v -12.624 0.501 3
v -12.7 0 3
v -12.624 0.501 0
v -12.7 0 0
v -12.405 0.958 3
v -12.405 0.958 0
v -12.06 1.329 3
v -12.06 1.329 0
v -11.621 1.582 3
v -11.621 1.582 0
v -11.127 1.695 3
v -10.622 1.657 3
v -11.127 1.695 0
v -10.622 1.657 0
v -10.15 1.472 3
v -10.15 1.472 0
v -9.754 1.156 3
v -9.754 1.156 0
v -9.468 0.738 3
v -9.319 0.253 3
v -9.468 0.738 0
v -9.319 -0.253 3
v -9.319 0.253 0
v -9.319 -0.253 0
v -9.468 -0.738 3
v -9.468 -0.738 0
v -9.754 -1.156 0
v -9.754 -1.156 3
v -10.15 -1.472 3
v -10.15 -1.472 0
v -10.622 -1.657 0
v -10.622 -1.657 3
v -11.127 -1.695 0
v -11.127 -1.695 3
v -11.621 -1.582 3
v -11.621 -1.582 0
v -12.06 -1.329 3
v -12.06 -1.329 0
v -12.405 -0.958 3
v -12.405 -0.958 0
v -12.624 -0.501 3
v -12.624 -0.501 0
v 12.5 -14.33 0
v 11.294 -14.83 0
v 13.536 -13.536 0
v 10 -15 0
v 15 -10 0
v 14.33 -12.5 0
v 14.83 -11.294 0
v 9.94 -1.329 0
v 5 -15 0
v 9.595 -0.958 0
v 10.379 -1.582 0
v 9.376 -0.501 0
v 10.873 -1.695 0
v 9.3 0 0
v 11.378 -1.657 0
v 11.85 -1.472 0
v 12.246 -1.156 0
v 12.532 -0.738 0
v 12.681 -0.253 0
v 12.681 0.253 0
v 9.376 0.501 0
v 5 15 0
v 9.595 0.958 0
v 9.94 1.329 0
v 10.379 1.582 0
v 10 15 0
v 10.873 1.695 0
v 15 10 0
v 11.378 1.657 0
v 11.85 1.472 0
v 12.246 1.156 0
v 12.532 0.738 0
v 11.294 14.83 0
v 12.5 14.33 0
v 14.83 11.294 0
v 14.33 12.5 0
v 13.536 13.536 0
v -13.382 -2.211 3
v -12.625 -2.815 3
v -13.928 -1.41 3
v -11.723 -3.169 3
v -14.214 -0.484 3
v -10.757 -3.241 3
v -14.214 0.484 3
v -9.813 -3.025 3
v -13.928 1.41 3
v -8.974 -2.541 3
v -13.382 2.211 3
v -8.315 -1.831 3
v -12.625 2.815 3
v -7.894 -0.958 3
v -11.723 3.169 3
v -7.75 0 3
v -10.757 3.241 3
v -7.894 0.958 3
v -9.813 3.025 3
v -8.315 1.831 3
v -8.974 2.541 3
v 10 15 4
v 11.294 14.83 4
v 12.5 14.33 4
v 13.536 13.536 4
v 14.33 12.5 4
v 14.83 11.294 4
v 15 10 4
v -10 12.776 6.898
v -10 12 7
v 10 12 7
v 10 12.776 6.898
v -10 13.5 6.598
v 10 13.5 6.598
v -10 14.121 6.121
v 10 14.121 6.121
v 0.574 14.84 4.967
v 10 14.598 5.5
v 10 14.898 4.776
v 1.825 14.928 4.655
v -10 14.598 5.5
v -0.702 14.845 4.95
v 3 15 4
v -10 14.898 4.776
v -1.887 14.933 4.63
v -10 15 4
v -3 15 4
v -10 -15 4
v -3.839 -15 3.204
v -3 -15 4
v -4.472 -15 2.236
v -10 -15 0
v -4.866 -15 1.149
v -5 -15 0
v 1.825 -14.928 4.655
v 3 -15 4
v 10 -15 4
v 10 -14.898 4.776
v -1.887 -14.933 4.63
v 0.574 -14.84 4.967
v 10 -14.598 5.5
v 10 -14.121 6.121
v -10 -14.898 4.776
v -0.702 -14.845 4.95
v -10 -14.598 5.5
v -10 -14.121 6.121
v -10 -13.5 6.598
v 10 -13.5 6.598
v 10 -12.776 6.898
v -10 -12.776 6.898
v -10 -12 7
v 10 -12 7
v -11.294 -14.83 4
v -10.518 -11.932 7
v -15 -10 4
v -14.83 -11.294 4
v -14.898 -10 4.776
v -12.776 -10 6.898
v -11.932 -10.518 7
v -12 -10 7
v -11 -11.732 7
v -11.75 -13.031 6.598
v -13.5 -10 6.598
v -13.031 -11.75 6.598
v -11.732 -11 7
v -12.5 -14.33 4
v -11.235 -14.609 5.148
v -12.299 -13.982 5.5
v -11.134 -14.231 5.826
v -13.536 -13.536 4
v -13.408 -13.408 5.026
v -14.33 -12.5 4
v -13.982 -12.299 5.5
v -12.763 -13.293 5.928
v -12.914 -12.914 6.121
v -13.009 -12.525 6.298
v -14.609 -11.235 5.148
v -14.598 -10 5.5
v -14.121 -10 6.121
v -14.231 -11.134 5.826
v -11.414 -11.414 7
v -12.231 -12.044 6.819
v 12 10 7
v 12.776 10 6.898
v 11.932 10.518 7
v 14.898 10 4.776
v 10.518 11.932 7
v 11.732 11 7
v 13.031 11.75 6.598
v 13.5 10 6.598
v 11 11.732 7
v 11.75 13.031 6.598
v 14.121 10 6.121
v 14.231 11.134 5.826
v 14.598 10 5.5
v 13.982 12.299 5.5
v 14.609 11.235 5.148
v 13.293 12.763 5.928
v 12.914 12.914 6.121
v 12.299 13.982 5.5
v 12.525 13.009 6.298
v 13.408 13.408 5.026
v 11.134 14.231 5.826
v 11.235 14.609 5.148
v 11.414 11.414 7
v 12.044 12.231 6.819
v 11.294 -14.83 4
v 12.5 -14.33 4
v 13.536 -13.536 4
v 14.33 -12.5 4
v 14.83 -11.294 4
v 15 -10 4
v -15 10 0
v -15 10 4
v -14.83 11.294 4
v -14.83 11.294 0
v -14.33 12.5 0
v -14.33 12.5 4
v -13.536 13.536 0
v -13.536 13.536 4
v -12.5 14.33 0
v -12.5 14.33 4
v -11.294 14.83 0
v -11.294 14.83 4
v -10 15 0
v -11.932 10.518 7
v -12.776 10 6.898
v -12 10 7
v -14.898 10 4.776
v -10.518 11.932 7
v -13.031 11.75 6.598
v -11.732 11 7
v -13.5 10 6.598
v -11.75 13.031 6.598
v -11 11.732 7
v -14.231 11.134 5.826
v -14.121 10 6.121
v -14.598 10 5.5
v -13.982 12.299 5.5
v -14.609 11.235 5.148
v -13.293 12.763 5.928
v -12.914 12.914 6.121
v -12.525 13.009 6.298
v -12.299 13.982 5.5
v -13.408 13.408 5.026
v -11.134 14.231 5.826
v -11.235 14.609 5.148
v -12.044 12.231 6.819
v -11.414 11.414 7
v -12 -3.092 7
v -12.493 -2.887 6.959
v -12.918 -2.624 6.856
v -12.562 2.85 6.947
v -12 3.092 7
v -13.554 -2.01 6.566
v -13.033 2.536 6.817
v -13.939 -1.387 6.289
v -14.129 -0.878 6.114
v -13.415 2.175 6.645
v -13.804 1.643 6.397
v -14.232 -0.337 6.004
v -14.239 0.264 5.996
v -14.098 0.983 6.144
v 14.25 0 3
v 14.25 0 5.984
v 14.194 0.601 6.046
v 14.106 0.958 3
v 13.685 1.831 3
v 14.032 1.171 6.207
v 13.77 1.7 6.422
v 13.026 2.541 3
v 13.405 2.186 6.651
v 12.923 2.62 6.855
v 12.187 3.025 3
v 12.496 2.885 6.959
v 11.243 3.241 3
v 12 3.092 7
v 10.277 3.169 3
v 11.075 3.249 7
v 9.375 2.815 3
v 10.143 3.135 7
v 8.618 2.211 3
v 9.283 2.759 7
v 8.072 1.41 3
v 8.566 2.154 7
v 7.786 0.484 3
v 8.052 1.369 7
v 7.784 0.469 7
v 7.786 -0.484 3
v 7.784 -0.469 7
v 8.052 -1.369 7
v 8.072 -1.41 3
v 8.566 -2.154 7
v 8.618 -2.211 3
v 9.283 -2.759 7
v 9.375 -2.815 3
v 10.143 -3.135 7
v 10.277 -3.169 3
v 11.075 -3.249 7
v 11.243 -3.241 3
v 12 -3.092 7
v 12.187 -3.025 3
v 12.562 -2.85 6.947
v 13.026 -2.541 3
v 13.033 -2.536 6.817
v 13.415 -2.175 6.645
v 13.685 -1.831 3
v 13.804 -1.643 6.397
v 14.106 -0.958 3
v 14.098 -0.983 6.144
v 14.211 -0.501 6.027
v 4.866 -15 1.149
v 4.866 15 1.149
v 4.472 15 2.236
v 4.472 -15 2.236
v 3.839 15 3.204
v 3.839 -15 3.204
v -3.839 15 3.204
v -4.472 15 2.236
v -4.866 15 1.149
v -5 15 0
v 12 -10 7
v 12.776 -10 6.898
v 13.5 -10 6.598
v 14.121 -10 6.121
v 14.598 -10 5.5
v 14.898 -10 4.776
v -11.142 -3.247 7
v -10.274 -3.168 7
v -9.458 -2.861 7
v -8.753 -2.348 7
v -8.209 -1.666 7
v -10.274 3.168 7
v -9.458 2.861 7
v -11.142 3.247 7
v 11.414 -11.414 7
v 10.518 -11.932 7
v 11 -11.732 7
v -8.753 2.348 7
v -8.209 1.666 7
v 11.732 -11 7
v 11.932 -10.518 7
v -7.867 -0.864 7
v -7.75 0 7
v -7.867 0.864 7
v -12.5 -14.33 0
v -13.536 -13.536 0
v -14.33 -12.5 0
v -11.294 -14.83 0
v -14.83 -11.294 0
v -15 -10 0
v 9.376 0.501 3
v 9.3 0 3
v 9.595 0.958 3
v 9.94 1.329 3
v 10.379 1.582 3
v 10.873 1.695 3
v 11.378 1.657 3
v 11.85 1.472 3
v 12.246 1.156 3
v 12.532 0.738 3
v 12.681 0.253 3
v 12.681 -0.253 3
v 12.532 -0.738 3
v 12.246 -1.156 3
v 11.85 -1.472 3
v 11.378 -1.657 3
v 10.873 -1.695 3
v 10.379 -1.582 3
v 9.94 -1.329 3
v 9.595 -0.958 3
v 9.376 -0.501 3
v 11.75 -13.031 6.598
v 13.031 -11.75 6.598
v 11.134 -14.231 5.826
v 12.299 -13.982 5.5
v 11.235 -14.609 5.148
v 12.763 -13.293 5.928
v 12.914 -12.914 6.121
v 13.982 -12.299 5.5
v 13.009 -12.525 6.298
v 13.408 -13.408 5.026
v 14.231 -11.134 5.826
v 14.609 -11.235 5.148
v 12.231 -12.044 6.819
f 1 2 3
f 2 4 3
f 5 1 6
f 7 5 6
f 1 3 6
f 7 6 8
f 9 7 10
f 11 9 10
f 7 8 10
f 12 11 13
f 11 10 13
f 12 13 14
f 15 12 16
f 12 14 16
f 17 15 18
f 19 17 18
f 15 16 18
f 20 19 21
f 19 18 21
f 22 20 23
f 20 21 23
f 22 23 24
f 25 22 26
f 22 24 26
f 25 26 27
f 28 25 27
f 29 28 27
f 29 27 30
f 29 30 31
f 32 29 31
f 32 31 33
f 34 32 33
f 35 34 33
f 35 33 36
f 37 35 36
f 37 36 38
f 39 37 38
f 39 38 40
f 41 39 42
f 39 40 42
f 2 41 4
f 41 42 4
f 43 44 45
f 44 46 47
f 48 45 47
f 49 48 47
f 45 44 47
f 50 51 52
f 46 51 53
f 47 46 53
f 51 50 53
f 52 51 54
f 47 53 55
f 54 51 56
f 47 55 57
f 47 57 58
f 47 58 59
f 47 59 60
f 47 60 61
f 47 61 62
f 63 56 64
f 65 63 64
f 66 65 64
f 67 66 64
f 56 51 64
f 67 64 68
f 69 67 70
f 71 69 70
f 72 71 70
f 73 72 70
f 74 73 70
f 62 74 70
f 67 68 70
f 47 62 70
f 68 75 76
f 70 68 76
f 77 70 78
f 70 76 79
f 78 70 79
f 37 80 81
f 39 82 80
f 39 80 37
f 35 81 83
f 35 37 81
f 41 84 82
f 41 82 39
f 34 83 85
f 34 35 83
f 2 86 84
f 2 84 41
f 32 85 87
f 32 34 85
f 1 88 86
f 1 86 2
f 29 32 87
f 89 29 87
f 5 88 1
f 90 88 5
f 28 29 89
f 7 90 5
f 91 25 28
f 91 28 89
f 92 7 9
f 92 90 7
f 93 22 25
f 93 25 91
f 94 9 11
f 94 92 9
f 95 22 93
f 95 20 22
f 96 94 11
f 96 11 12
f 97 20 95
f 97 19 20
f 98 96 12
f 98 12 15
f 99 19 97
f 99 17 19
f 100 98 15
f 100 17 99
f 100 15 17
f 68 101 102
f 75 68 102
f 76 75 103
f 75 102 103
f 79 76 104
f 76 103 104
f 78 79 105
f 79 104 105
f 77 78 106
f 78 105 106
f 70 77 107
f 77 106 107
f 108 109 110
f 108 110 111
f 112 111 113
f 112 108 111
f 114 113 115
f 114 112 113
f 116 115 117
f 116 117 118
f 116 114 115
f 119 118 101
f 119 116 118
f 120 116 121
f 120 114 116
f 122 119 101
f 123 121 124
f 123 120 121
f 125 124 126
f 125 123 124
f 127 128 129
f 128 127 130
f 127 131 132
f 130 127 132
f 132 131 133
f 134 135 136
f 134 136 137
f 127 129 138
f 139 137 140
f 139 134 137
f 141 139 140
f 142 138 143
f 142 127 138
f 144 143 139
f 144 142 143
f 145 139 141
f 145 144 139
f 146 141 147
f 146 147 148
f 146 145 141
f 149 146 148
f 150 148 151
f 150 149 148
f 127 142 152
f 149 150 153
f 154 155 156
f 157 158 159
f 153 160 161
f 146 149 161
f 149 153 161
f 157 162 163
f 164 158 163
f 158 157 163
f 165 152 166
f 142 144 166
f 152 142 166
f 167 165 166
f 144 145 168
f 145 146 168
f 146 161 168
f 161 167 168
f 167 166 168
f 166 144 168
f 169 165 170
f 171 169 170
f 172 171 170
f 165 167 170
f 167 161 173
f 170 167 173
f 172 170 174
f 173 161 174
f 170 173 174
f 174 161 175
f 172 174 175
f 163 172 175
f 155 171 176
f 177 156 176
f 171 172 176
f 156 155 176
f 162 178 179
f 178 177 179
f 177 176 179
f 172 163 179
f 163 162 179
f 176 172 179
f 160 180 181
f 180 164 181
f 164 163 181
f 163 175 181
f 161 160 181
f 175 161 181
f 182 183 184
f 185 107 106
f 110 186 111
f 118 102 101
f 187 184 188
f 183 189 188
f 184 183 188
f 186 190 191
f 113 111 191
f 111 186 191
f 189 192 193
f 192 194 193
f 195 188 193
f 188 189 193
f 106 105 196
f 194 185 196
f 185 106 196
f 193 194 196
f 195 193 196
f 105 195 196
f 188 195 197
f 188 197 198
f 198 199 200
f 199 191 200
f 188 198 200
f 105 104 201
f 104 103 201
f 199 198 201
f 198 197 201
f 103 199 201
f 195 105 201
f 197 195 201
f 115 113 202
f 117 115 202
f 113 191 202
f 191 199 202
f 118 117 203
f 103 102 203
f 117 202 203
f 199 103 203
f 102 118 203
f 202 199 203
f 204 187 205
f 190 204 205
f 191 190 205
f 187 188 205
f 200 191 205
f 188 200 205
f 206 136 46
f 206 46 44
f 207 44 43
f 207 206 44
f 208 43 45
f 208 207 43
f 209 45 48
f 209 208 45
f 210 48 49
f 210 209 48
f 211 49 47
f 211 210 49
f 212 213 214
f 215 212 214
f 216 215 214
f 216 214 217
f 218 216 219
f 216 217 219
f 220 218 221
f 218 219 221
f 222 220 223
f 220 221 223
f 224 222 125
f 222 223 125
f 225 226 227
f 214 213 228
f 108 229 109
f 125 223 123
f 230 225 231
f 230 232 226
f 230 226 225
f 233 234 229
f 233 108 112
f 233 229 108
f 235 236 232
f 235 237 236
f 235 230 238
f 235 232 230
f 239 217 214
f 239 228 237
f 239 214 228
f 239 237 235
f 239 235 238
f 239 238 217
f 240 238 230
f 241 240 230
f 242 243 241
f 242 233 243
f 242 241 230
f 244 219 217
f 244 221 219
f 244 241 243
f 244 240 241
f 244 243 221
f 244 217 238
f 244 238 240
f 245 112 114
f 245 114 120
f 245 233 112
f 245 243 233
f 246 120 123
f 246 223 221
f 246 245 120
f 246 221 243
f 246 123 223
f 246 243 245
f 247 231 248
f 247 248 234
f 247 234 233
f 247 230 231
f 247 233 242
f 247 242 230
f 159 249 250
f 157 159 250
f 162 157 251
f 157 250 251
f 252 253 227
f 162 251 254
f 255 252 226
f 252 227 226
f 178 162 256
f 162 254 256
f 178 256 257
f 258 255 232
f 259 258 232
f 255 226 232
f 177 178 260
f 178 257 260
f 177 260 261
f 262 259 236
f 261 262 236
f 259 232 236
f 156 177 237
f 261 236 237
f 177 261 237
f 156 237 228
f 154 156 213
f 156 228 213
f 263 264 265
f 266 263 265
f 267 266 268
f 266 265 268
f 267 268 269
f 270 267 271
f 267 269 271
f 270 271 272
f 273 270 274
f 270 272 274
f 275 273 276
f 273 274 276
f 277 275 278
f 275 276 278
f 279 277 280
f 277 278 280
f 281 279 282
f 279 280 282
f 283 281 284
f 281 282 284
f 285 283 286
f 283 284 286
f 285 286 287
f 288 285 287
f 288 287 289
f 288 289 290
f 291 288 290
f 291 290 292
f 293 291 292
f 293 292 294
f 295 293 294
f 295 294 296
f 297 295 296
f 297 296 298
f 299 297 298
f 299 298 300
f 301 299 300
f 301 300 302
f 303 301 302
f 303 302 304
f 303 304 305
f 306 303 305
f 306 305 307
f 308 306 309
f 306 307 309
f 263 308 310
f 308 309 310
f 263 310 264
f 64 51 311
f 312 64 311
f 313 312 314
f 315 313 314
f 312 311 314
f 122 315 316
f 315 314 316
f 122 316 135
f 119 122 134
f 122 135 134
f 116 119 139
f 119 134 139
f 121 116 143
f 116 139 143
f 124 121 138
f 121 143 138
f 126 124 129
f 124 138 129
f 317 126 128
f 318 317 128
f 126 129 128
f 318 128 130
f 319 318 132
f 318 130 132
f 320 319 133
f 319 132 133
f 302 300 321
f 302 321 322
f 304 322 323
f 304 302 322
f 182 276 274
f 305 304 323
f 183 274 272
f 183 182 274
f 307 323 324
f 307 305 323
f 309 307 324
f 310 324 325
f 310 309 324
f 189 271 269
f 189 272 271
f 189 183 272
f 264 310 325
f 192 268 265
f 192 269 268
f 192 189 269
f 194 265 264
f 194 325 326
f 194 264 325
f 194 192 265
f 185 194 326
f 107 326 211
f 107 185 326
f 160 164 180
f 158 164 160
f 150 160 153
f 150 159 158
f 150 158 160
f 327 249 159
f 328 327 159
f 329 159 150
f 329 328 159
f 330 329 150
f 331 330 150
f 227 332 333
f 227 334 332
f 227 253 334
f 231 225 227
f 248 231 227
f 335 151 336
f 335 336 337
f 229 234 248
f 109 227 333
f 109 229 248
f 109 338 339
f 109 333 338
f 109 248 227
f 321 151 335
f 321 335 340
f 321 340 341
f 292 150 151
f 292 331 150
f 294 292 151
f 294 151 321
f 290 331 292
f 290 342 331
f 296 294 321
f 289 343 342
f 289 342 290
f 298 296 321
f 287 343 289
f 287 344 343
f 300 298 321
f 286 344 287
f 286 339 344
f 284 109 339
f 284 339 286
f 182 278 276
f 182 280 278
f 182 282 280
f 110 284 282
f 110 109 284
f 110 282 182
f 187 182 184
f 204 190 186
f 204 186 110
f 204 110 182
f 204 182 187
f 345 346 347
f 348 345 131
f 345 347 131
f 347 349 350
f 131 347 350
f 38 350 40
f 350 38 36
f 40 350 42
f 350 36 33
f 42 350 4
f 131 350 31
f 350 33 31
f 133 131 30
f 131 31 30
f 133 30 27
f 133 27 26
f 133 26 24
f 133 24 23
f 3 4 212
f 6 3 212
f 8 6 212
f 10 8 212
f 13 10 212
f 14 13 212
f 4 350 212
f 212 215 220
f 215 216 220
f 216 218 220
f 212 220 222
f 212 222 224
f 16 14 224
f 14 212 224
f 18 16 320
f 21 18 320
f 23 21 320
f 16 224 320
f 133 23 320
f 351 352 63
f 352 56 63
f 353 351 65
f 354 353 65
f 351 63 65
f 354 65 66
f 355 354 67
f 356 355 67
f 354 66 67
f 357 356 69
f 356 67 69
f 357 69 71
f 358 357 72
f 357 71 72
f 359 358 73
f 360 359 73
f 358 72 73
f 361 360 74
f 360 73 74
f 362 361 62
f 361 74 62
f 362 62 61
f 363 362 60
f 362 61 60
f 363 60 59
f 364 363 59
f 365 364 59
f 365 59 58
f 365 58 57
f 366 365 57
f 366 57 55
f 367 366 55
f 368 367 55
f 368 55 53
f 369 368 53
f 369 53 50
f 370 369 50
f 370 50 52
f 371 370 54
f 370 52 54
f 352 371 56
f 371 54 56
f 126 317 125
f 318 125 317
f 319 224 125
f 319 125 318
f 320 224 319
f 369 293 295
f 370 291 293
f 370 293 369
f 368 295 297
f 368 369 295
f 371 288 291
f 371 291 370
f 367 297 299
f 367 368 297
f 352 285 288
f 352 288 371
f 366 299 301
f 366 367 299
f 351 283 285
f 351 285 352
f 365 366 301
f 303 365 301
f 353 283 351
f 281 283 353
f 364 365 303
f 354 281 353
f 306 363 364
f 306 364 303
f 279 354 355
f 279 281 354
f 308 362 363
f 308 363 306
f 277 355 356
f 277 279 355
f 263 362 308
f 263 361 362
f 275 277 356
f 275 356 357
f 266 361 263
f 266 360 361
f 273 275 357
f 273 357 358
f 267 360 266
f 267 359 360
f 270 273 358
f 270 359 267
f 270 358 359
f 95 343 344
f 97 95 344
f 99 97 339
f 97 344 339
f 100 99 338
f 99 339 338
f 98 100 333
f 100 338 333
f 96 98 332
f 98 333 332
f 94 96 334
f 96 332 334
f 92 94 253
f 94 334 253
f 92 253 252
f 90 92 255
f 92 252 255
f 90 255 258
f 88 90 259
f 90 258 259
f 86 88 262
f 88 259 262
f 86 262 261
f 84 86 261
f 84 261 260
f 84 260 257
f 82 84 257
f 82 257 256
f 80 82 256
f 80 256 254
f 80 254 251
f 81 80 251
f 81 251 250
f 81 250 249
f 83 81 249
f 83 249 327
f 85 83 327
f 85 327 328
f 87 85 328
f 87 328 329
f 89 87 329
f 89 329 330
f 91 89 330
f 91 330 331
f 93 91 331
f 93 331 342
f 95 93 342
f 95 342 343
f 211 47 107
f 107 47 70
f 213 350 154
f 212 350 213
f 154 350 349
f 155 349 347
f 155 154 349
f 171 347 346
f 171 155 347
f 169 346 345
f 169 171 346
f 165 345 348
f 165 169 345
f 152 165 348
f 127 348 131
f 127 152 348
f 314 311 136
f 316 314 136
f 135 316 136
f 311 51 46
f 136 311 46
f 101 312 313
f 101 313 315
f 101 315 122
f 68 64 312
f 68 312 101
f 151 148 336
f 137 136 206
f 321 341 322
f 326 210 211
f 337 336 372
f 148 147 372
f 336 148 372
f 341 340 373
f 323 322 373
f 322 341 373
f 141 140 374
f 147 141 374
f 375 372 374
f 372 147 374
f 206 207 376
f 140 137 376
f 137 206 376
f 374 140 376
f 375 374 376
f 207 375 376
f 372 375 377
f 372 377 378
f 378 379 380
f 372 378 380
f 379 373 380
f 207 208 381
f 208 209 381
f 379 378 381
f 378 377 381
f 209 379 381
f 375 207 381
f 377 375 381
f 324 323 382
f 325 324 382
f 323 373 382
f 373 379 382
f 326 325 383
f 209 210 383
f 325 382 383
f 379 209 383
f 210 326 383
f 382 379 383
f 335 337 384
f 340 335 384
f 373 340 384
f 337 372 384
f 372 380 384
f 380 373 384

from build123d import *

# Parameters (mm, degrees)
F0_W           = 30
F0_H           = 30
F1_DEPTH       = 7
F3_D           = 3.4
F3_CBORE_D     = 6.5
F3_CBORE_DEPTH = 4
F5_DEPTH       = 30
F6_R           = 5
F7_T1_DEPTH    = 20
F7_T3_DEPTH    = 20
F7_T6_ANGLE    = 90
F7_T8_ANGLE    = 90
F7_T10_ANGLE   = 90
F7_T12_ANGLE   = 90


# Not quite as in the source:
# - a fillet or chamfer that OpenCascade refuses, or shapes differently, is made with other operations: its cross-section is extruded or revolved along the edge and cut away or added


with BuildPart() as f1:
    # F0 (on Top) → F1 (new body)
    with BuildSketch(Plane.XY):
        Rectangle(F0_W, F0_H)
    extrude(amount=F1_DEPTH)

    # F3 (through all)
    with Locations(Plane.XY.offset(7)):
        with Locations((-11, 0), (11, 0)):
            CounterBoreHole(F3_D / 2, F3_CBORE_D / 2, F3_CBORE_DEPTH)

    # F4 (on face) → F5 (cut, through all)
    with BuildSketch(Plane.XZ.offset(15)):
        with BuildLine():
            Line((-5, 0), (5, 0))
            ThreePointArc((5, 0), (0, 5), (-5, 0))
        make_face()
    extrude(amount=-F5_DEPTH, mode=Mode.SUBTRACT)

    # F6
    f6_edges = [f1.edges().sort_by_distance(p)[0] for p in [
        (15, -15, 3.5),
        (-15, -15, 3.5),
        (15, 15, 3.5),
        (-15, 15, 3.5),
    ]]
    fillet(f6_edges, radius=F6_R)

    # F7: fillet of radius 3 on 8 edges, made by hand

    # F7_s2 → F7_t1 (cut)
    with BuildSketch(Plane.YZ.offset(-10)):
        with BuildLine():
            ThreePointArc((-15, 4), (-14.1213203436, 6.1213203436), (-12, 7))
            Line((-12, 7), (-15, 7))
            Line((-15, 7), (-15, 4))
        make_face()
        with BuildLine():
            ThreePointArc((12, 7), (14.1213203436, 6.1213203436), (15, 4))
            Line((15, 4), (15, 7))
            Line((15, 7), (12, 7))
        make_face()
    extrude(amount=F7_T1_DEPTH, mode=Mode.SUBTRACT)

    # F7_s4 → F7_t3 (cut)
    with BuildSketch(Plane.XZ.offset(-10)):
        with BuildLine():
            ThreePointArc((-12, 7), (-14.1213203436, 6.1213203436), (-15, 4))
            Line((-15, 4), (-15, 7))
            Line((-15, 7), (-12, 7))
        make_face()
        with BuildLine():
            ThreePointArc((12, 7), (14.1213203436, 6.1213203436), (15, 4))
            Line((15, 4), (15, 7))
            Line((15, 7), (12, 7))
        make_face()
    extrude(amount=F7_T3_DEPTH, mode=Mode.SUBTRACT)

    # F7_s5 → F7_t6 (revolve, cut)
    with BuildSketch(Plane.YZ.offset(-10)):
        with BuildLine():
            ThreePointArc((-15, 4), (-14.1213203436, 6.1213203436), (-12, 7))
            Line((-12, 7), (-15, 7))
            Line((-15, 7), (-15, 4))
        make_face()
    revolve(axis=Axis((-10, -10, 7), (0, 0, -1)), revolution_arc=F7_T6_ANGLE, mode=Mode.SUBTRACT)

    # F7_s7 → F7_t8 (revolve, cut)
    with BuildSketch(Plane.YZ.offset(10)):
        with BuildLine():
            ThreePointArc((-12, 7), (-14.1213203436, 6.1213203436), (-15, 4))
            Line((-15, 4), (-15, 7))
            Line((-15, 7), (-12, 7))
        make_face()
    revolve(axis=Axis((10, -10, 7), (0, 0, 1)), revolution_arc=F7_T8_ANGLE, mode=Mode.SUBTRACT)

    # F7_s9 → F7_t10 (revolve, cut)
    with BuildSketch(Plane.XZ.offset(-10)):
        with BuildLine():
            ThreePointArc((-12, 7), (-14.1213203436, 6.1213203436), (-15, 4))
            Line((-15, 4), (-15, 7))
            Line((-15, 7), (-12, 7))
        make_face()
    revolve(axis=Axis((-10, 10, 7), (0, 0, -1)), revolution_arc=F7_T10_ANGLE, mode=Mode.SUBTRACT)

    # F7_s11 → F7_t12 (revolve, cut)
    with BuildSketch(Plane.XZ.offset(-10)):
        with BuildLine():
            ThreePointArc((12, 7), (14.1213203436, 6.1213203436), (15, 4))
            Line((15, 4), (15, 7))
            Line((15, 7), (12, 7))
        make_face()
    revolve(axis=Axis((10, 10, 7), (0, 0, 1)), revolution_arc=F7_T12_ANGLE, mode=Mode.SUBTRACT)


solid = f1.part
